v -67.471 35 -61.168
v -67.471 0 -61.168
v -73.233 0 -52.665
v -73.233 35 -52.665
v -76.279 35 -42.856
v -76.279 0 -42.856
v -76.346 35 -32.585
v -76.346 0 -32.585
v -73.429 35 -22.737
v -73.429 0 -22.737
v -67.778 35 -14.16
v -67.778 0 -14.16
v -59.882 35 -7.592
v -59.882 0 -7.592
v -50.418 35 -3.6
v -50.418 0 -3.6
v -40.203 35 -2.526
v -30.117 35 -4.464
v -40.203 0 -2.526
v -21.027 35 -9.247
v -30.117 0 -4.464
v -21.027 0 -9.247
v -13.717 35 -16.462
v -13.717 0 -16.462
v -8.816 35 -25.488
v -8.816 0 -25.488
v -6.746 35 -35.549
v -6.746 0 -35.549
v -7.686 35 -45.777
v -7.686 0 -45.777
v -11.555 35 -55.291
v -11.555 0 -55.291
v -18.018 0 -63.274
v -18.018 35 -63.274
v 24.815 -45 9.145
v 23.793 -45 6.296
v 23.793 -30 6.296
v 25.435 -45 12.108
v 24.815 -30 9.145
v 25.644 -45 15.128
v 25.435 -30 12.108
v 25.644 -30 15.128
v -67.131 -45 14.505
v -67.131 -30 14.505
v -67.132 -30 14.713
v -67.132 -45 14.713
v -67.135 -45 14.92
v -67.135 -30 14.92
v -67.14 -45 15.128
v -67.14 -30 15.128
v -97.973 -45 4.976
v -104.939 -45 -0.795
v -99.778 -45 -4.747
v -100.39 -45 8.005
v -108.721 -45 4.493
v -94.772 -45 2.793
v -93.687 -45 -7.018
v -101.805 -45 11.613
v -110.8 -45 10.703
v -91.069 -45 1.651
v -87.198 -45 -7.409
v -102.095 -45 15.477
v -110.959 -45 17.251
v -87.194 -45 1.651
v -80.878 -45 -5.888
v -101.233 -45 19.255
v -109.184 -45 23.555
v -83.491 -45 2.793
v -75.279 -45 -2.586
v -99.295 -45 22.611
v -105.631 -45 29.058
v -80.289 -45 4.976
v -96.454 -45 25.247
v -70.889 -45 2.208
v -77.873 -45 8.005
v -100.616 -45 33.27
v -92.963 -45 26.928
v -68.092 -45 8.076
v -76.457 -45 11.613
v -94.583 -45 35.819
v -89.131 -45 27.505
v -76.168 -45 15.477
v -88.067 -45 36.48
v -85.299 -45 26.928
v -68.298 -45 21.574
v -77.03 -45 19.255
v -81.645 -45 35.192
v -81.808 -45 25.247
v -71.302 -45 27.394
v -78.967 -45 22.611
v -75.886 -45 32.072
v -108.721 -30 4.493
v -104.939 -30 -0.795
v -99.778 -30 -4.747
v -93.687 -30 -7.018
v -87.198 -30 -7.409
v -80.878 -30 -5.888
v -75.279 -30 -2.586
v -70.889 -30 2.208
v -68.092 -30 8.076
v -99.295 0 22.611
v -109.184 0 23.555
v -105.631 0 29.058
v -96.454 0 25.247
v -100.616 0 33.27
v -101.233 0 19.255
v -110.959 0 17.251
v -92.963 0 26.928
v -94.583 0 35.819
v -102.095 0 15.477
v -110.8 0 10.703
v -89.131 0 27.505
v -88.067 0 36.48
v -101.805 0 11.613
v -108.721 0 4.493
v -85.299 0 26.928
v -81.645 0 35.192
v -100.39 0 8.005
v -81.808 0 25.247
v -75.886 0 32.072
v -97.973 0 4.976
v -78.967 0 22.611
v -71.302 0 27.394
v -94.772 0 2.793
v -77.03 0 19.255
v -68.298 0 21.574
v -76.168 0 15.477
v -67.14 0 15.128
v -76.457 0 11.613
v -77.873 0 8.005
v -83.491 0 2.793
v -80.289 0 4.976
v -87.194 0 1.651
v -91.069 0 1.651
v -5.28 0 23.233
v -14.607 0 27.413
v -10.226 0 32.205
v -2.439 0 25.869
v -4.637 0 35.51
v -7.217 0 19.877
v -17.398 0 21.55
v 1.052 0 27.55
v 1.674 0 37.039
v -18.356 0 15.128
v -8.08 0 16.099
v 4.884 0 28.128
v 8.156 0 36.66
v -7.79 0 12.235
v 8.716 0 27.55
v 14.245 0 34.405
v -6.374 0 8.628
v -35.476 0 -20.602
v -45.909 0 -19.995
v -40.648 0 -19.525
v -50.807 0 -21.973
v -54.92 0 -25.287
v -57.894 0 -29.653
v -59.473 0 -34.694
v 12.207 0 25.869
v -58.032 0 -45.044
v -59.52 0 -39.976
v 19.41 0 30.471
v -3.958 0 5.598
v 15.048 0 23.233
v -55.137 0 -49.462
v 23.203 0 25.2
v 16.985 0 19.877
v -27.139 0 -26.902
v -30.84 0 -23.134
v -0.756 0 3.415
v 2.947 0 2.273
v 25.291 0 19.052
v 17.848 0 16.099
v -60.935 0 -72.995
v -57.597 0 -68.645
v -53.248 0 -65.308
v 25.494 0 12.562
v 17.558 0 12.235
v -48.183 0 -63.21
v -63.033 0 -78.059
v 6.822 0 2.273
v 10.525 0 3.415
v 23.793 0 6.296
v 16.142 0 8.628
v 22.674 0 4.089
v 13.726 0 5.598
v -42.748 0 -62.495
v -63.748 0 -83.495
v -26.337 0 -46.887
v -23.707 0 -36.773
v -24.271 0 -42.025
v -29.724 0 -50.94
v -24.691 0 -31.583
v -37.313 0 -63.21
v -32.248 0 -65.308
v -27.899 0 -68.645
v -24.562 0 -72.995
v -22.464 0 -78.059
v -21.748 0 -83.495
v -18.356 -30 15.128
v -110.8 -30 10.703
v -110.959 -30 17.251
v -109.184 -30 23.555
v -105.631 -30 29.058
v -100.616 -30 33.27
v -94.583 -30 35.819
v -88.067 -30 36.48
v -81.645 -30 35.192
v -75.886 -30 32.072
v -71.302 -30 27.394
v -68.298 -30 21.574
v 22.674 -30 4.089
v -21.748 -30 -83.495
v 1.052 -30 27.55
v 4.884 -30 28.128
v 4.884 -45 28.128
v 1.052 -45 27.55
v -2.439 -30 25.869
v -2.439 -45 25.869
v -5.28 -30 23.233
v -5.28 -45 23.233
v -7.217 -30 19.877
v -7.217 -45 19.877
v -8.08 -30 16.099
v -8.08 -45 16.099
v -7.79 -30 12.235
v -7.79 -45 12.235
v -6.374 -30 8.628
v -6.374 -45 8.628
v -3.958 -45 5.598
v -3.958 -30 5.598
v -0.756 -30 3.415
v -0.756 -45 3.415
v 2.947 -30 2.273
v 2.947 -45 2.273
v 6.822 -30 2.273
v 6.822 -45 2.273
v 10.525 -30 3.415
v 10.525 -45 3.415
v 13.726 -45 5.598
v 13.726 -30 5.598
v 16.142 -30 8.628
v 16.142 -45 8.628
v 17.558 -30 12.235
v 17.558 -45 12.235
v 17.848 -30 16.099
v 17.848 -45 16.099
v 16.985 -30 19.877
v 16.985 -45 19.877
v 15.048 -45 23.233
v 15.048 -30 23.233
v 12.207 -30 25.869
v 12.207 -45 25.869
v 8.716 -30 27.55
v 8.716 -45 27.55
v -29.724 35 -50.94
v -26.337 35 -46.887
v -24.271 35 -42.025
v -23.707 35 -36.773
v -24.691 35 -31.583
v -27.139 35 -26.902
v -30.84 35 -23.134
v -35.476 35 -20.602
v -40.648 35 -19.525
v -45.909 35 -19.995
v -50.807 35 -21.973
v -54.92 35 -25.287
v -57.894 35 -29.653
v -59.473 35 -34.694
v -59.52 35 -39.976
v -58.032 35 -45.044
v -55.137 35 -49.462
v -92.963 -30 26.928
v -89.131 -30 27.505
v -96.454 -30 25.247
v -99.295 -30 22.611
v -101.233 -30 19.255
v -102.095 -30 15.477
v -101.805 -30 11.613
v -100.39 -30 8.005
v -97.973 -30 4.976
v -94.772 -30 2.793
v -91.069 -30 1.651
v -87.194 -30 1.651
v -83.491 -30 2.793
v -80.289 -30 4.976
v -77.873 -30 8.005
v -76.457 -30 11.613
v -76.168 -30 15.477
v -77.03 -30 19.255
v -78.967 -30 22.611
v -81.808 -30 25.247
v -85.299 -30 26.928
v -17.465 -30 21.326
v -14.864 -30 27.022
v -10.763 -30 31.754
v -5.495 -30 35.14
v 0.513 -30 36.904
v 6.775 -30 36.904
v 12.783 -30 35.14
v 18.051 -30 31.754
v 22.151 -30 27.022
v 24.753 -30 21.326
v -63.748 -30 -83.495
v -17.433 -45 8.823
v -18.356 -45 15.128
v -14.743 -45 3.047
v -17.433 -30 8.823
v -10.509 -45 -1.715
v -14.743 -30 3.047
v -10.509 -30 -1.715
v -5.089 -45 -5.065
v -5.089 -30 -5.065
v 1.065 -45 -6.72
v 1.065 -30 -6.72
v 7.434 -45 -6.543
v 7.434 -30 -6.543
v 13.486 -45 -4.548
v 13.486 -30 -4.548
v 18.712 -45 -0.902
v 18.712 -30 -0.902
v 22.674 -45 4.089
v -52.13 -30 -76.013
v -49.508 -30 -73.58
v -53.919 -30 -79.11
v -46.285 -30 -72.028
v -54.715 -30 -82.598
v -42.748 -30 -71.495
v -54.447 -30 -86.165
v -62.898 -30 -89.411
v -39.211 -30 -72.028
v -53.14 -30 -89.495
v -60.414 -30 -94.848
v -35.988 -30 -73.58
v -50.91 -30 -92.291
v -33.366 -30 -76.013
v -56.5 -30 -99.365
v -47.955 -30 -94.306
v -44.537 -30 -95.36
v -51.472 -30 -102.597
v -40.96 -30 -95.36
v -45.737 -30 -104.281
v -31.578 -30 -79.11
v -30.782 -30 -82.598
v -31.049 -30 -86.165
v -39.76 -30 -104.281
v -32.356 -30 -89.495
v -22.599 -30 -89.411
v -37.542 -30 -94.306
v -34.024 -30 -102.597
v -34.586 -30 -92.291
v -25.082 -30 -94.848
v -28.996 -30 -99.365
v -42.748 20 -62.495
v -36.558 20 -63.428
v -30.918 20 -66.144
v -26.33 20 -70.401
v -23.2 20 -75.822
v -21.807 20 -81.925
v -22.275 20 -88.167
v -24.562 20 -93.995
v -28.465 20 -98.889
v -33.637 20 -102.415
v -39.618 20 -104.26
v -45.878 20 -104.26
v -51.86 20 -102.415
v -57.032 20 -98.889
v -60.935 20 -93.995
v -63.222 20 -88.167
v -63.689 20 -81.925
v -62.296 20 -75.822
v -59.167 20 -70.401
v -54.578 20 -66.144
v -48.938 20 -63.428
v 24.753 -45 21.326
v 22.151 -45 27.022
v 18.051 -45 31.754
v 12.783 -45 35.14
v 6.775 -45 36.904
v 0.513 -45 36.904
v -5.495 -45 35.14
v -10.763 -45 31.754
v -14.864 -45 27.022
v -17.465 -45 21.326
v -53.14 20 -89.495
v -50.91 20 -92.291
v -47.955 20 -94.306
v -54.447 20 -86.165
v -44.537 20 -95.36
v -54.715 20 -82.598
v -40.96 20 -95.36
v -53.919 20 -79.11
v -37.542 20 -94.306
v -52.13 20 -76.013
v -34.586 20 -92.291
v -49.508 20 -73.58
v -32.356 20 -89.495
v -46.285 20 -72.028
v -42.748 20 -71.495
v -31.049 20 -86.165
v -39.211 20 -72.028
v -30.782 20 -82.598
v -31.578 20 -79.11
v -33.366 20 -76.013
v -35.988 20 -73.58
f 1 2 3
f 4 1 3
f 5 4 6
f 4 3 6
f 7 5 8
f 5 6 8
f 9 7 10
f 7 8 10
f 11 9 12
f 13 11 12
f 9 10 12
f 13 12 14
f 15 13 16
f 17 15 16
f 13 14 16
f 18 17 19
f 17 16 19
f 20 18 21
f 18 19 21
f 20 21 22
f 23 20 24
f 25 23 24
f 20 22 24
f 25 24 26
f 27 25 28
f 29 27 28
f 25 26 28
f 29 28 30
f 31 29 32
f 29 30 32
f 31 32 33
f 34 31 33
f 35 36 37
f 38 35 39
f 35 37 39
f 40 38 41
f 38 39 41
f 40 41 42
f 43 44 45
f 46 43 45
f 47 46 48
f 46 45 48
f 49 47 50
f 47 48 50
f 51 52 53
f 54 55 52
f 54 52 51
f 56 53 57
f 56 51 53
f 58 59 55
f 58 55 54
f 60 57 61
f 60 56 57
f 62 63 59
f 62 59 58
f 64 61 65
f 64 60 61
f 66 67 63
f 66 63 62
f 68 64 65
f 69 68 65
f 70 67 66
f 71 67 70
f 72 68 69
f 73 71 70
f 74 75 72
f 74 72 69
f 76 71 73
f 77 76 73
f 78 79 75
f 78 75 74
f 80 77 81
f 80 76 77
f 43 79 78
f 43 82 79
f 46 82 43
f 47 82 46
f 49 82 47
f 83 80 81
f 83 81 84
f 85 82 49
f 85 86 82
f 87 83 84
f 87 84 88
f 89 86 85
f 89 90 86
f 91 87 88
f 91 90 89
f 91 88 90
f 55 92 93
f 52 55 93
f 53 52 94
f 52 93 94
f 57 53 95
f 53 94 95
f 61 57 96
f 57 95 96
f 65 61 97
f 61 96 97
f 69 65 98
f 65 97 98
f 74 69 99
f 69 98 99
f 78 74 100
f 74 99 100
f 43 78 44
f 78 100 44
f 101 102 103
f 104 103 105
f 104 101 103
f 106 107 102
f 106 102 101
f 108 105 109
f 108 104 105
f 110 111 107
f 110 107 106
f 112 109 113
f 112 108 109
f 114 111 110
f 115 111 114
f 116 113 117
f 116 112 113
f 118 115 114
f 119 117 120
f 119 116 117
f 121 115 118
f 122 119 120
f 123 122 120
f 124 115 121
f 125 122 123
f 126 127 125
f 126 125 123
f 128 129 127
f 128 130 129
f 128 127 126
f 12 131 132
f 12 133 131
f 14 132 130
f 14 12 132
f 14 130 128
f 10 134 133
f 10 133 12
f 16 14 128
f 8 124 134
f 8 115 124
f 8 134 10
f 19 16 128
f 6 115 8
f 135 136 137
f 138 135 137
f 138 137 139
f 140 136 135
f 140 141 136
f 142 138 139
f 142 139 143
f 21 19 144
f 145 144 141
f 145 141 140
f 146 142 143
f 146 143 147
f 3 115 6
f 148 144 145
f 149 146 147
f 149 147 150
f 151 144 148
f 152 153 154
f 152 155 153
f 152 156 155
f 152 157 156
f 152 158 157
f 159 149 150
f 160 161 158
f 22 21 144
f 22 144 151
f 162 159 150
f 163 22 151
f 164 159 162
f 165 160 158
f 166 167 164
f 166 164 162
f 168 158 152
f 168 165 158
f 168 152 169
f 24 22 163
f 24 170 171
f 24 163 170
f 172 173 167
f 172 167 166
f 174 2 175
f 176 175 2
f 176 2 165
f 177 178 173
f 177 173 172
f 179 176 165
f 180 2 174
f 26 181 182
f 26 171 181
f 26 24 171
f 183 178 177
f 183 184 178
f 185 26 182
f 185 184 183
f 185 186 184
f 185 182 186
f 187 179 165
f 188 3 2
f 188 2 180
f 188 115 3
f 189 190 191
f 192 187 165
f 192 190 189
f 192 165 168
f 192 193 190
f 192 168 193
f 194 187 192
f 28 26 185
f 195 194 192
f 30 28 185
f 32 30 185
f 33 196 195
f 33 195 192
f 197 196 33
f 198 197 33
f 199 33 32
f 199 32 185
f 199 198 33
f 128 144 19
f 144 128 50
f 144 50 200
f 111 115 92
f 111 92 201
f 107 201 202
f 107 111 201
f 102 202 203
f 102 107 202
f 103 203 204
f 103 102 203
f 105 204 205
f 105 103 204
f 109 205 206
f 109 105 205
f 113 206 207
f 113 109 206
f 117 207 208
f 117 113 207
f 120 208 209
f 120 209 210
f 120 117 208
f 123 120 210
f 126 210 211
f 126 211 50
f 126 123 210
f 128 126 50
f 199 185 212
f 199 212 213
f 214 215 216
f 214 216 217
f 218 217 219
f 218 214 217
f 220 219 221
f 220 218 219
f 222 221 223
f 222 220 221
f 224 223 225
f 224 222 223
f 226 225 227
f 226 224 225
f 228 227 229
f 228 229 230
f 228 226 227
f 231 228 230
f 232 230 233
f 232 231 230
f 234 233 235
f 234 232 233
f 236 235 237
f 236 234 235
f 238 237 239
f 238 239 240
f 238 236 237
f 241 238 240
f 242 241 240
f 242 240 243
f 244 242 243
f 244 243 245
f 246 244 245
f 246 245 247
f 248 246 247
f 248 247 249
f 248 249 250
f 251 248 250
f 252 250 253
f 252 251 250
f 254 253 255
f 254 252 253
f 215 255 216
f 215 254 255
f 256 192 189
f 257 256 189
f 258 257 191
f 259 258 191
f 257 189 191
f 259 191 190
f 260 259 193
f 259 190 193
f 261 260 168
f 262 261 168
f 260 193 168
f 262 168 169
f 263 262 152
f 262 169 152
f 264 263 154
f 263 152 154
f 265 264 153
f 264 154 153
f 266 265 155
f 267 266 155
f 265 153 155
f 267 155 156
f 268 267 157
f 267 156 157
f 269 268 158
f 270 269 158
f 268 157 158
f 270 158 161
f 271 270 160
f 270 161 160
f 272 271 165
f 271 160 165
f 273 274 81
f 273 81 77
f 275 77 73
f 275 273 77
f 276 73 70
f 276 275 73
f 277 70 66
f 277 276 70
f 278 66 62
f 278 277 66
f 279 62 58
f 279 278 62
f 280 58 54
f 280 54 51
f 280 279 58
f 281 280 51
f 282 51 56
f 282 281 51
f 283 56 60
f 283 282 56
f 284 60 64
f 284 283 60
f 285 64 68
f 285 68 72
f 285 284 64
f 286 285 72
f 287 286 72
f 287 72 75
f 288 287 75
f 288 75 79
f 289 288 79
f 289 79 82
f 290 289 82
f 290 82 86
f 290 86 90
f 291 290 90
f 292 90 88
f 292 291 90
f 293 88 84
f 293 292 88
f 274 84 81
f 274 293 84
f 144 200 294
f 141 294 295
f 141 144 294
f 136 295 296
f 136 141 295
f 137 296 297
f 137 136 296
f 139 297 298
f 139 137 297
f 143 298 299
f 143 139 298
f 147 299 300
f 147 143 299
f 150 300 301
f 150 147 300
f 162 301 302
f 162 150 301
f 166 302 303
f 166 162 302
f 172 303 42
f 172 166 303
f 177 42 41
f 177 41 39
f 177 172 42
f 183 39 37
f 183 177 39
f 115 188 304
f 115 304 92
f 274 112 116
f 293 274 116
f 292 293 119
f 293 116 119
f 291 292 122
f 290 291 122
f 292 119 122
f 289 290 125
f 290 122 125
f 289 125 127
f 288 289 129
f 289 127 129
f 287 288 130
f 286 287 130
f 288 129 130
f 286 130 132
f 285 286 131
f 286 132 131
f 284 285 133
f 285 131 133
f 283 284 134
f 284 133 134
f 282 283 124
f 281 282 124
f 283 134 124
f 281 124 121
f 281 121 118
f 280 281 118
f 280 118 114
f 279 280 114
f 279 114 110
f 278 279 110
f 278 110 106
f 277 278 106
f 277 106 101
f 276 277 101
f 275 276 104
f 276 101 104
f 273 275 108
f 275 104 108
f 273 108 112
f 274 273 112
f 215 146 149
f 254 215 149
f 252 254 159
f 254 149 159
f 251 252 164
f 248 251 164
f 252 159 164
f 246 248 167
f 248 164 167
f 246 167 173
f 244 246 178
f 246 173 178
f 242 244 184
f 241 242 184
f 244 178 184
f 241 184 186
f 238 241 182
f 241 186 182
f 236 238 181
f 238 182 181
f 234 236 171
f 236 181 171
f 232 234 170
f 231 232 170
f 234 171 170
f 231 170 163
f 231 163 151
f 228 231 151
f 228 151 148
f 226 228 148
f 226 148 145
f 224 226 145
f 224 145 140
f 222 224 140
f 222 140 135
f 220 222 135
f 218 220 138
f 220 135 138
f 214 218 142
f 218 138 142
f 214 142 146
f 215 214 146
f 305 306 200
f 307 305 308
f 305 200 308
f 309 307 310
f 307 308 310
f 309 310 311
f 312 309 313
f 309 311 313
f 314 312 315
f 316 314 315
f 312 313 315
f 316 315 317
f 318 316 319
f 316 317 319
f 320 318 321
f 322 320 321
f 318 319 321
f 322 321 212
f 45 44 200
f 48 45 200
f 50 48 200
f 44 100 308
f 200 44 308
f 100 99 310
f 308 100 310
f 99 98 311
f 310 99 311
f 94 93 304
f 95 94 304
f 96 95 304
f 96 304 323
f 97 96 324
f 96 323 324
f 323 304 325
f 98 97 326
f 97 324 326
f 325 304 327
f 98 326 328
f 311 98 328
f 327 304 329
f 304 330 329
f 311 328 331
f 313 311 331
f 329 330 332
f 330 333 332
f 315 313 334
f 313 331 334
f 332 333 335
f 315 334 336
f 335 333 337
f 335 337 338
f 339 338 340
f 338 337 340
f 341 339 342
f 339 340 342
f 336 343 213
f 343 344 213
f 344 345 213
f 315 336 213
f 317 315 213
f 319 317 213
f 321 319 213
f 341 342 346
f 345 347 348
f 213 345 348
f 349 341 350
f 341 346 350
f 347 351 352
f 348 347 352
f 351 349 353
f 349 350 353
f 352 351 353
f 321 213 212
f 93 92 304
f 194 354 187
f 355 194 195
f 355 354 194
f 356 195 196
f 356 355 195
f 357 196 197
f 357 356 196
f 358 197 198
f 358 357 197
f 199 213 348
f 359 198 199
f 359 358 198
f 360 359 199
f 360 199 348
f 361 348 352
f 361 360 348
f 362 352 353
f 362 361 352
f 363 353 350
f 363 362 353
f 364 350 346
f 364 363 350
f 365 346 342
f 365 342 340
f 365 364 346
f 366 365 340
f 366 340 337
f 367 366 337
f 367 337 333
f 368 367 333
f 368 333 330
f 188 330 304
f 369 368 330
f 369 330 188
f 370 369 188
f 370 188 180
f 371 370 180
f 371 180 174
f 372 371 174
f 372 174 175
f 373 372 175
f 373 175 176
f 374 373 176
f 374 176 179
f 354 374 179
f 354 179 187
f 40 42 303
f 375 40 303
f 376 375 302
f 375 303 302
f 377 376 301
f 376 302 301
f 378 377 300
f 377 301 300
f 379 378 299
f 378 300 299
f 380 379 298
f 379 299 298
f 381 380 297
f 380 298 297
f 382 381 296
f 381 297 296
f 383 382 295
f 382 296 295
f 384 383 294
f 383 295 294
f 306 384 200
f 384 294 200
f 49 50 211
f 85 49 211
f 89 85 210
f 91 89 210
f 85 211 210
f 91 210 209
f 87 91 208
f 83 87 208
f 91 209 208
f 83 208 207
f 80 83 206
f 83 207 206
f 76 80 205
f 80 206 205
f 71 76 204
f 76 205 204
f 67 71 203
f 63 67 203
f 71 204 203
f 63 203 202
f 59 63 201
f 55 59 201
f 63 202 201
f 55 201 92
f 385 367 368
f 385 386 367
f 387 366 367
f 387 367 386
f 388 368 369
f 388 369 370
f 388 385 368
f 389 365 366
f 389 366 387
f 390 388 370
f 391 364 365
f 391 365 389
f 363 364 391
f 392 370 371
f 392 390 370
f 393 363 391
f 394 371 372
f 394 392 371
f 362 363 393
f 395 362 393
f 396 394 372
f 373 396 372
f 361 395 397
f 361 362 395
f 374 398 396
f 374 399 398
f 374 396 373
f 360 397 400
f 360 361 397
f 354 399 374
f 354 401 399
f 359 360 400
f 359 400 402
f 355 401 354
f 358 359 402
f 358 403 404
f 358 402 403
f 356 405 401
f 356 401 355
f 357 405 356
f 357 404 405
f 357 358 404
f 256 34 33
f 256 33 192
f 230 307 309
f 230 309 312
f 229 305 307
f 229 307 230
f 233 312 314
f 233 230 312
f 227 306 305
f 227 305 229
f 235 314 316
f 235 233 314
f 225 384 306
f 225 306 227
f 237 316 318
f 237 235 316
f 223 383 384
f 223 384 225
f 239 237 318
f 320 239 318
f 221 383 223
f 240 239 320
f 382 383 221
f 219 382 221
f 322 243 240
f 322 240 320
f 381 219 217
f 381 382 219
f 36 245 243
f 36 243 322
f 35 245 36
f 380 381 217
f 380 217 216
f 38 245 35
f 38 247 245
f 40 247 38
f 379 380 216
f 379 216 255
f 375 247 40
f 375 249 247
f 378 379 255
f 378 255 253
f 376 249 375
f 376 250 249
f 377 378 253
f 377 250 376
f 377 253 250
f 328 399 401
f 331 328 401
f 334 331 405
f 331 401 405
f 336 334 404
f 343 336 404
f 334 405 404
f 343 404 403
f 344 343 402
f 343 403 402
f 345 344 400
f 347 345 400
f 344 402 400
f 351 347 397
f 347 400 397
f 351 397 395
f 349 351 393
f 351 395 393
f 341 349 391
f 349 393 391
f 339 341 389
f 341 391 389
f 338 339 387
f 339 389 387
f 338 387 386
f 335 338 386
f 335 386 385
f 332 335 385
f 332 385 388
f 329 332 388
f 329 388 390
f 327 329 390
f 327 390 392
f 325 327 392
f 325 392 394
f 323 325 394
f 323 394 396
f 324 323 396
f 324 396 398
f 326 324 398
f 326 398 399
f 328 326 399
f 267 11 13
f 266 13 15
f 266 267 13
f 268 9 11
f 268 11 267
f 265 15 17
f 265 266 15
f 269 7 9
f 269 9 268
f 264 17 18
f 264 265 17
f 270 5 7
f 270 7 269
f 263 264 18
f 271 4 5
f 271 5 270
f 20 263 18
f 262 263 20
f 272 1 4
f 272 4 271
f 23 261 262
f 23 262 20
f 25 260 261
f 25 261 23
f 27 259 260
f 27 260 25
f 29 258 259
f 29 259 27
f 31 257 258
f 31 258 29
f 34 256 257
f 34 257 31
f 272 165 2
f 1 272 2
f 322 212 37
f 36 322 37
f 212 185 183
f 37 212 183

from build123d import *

# Parameters (mm, degrees)
SKETCH2_R           = 13
BOSS_EXTRUDE1_DEPTH = 30
SKETCH3_R           = 21
SKETCH3_R_2         = 12
BOSS_EXTRUDE3_DEPTH = 30
BOSS_EXTRUDE4_START = 20
SKETCH4_R           = 21
BOSS_EXTRUDE4_DEPTH = 20
CUT_EXTRUDE3_START  = 20
SKETCH6_R           = 12
CUT_EXTRUDE3_DEPTH  = 20
BOSS_EXTRUDE5_DEPTH = 35
SKETCH8_R           = 13
BOSS_EXTRUDE6_DEPTH = 15


with BuildPart() as part:
    # Sketch2 → Boss-Extrude1 (new body)
    with BuildSketch(Plane(origin=(0, 0, 0), x_dir=(1, 0, 0), z_dir=(0, 1, 0))):
        with BuildLine():
            Line((-63.748151168, 83.4945297), (-108.720702631, -4.492807031))
            ThreePointArc((-108.720702631, -4.492807031), (-94.582688401, -35.819358768), (-67.140057524, -15.127855665))
            Line((-67.140057524, -15.127855665), (-18.356244812, -15.127855665))
            ThreePointArc((-18.356244812, -15.127855665), (8.155744942, -36.660202227), (23.79302323, -6.295698659))
            Line((23.79302323, -6.295698659), (22.673576153, -4.088566102))
            Line((22.673576153, -4.088566102), (-21.748151168, 83.4945297))
            ThreePointArc((-21.748151168, 83.4945297), (-42.748151168, 62.4945297), (-63.748151168, 83.4945297))
        make_face()
        with Locations(Location((-89.131252045, -14.5054703, 0), (0, 0, 270))):
            Circle(SKETCH2_R, mode=Mode.SUBTRACT)
        with Locations(Location((4.884095697, -15.127855665, 0), (0, 0, 270))):
            Circle(SKETCH2_R, mode=Mode.SUBTRACT)
    extrude(amount=-BOSS_EXTRUDE1_DEPTH)

    # Sketch3 → Boss-Extrude3 (add)
    with BuildSketch(Plane(origin=(0, 0, 0), x_dir=(1, 0, 0), z_dir=(0, 1, 0))):
        with Locations((-42.748151168, 83.4945297)):
            Circle(SKETCH3_R)
        with Locations(Location((-42.748151168, 83.4945297, 0), (0, 0, 270))):
            Circle(SKETCH3_R_2, mode=Mode.SUBTRACT)
    extrude(amount=-BOSS_EXTRUDE3_DEPTH)

    # Sketch4 → Boss-Extrude4 (add)
    with BuildSketch(Plane(origin=(0, 0, 0), x_dir=(1, 0, 0), z_dir=(0, 1, 0)).offset(BOSS_EXTRUDE4_START)):
        with Locations(Location((-42.748151168, 83.4945297, 0), (0, 0, 270))):
            Circle(SKETCH4_R)
    extrude(amount=-BOSS_EXTRUDE4_DEPTH)

    # Sketch6 → Cut-Extrude3 (cut)
    with BuildSketch(Plane(origin=(0, 0, 0), x_dir=(1, 0, 0), z_dir=(0, 1, 0)).offset(CUT_EXTRUDE3_START)):
        with Locations(Location((-42.748151168, 83.4945297, 0), (0, 0, 270))):
            Circle(SKETCH6_R)
    extrude(amount=-CUT_EXTRUDE3_DEPTH, mode=Mode.SUBTRACT)

    # Sketch7 → Boss-Extrude5 (add)
    with BuildSketch(Plane(origin=(0, 0, 0), x_dir=(1, 0, 0), z_dir=(0, 1, 0))):
        with BuildLine():
            Line((-55.137118112, 49.462443333), (-67.471148686, 61.168135895))
            ThreePointArc((-67.471148686, 61.168135895), (-40.20329361, 2.526208117), (-18.018474049, 63.273598143))
            Line((-18.018474049, 63.273598143), (-29.724166611, 50.939567569))
            ThreePointArc((-29.724166611, 50.939567569), (-40.647595679, 19.524859364), (-55.137118112, 49.462443333))
        make_face()
    extrude(amount=BOSS_EXTRUDE5_DEPTH)

    # Sketch8 → Boss-Extrude6 (add)
    # profile 1 of 2: a face of its own
    with BuildSketch(Plane.XZ.offset(30)):
        with BuildLine():
            ThreePointArc((25.643755188, 15.127855665), (3.643755188, 37.127855665), (-18.356244812, 15.127855665))
            ThreePointArc((-18.356244812, 15.127855665), (-2.072184751, -6.116626692), (22.673576153, 4.088566102))
            Line((22.673576153, 4.088566102), (23.79302323, 6.295698659))
            ThreePointArc((23.79302323, 6.295698659), (25.17610175, 10.615865911), (25.643755188, 15.127855665))
        make_face()
        with Locations(Location((4.884095697, 15.127855665, 0), (0, 0, 90))):
            Circle(SKETCH8_R, mode=Mode.SUBTRACT)
    # profile 2 of 2: a face of its own
    with BuildSketch(Plane.XZ.offset(30)):
        with BuildLine():
            ThreePointArc((-67.131252045, 14.5054703), (-67.133453525, 14.816694125), (-67.140057524, 15.127855665))
            ThreePointArc((-67.140057524, 15.127855665), (-94.582688401, 35.819358768), (-108.720702631, 4.492807031))
            ThreePointArc((-108.720702631, 4.492807031), (-83.981878922, -6.883404296), (-67.131252045, 14.5054703))
        make_face()
        with Locations(Location((-89.131252045, 14.5054703, 0), (0, 0, 90))):
            Circle(SKETCH8_R, mode=Mode.SUBTRACT)
    extrude(amount=BOSS_EXTRUDE6_DEPTH)


solid = part.part
